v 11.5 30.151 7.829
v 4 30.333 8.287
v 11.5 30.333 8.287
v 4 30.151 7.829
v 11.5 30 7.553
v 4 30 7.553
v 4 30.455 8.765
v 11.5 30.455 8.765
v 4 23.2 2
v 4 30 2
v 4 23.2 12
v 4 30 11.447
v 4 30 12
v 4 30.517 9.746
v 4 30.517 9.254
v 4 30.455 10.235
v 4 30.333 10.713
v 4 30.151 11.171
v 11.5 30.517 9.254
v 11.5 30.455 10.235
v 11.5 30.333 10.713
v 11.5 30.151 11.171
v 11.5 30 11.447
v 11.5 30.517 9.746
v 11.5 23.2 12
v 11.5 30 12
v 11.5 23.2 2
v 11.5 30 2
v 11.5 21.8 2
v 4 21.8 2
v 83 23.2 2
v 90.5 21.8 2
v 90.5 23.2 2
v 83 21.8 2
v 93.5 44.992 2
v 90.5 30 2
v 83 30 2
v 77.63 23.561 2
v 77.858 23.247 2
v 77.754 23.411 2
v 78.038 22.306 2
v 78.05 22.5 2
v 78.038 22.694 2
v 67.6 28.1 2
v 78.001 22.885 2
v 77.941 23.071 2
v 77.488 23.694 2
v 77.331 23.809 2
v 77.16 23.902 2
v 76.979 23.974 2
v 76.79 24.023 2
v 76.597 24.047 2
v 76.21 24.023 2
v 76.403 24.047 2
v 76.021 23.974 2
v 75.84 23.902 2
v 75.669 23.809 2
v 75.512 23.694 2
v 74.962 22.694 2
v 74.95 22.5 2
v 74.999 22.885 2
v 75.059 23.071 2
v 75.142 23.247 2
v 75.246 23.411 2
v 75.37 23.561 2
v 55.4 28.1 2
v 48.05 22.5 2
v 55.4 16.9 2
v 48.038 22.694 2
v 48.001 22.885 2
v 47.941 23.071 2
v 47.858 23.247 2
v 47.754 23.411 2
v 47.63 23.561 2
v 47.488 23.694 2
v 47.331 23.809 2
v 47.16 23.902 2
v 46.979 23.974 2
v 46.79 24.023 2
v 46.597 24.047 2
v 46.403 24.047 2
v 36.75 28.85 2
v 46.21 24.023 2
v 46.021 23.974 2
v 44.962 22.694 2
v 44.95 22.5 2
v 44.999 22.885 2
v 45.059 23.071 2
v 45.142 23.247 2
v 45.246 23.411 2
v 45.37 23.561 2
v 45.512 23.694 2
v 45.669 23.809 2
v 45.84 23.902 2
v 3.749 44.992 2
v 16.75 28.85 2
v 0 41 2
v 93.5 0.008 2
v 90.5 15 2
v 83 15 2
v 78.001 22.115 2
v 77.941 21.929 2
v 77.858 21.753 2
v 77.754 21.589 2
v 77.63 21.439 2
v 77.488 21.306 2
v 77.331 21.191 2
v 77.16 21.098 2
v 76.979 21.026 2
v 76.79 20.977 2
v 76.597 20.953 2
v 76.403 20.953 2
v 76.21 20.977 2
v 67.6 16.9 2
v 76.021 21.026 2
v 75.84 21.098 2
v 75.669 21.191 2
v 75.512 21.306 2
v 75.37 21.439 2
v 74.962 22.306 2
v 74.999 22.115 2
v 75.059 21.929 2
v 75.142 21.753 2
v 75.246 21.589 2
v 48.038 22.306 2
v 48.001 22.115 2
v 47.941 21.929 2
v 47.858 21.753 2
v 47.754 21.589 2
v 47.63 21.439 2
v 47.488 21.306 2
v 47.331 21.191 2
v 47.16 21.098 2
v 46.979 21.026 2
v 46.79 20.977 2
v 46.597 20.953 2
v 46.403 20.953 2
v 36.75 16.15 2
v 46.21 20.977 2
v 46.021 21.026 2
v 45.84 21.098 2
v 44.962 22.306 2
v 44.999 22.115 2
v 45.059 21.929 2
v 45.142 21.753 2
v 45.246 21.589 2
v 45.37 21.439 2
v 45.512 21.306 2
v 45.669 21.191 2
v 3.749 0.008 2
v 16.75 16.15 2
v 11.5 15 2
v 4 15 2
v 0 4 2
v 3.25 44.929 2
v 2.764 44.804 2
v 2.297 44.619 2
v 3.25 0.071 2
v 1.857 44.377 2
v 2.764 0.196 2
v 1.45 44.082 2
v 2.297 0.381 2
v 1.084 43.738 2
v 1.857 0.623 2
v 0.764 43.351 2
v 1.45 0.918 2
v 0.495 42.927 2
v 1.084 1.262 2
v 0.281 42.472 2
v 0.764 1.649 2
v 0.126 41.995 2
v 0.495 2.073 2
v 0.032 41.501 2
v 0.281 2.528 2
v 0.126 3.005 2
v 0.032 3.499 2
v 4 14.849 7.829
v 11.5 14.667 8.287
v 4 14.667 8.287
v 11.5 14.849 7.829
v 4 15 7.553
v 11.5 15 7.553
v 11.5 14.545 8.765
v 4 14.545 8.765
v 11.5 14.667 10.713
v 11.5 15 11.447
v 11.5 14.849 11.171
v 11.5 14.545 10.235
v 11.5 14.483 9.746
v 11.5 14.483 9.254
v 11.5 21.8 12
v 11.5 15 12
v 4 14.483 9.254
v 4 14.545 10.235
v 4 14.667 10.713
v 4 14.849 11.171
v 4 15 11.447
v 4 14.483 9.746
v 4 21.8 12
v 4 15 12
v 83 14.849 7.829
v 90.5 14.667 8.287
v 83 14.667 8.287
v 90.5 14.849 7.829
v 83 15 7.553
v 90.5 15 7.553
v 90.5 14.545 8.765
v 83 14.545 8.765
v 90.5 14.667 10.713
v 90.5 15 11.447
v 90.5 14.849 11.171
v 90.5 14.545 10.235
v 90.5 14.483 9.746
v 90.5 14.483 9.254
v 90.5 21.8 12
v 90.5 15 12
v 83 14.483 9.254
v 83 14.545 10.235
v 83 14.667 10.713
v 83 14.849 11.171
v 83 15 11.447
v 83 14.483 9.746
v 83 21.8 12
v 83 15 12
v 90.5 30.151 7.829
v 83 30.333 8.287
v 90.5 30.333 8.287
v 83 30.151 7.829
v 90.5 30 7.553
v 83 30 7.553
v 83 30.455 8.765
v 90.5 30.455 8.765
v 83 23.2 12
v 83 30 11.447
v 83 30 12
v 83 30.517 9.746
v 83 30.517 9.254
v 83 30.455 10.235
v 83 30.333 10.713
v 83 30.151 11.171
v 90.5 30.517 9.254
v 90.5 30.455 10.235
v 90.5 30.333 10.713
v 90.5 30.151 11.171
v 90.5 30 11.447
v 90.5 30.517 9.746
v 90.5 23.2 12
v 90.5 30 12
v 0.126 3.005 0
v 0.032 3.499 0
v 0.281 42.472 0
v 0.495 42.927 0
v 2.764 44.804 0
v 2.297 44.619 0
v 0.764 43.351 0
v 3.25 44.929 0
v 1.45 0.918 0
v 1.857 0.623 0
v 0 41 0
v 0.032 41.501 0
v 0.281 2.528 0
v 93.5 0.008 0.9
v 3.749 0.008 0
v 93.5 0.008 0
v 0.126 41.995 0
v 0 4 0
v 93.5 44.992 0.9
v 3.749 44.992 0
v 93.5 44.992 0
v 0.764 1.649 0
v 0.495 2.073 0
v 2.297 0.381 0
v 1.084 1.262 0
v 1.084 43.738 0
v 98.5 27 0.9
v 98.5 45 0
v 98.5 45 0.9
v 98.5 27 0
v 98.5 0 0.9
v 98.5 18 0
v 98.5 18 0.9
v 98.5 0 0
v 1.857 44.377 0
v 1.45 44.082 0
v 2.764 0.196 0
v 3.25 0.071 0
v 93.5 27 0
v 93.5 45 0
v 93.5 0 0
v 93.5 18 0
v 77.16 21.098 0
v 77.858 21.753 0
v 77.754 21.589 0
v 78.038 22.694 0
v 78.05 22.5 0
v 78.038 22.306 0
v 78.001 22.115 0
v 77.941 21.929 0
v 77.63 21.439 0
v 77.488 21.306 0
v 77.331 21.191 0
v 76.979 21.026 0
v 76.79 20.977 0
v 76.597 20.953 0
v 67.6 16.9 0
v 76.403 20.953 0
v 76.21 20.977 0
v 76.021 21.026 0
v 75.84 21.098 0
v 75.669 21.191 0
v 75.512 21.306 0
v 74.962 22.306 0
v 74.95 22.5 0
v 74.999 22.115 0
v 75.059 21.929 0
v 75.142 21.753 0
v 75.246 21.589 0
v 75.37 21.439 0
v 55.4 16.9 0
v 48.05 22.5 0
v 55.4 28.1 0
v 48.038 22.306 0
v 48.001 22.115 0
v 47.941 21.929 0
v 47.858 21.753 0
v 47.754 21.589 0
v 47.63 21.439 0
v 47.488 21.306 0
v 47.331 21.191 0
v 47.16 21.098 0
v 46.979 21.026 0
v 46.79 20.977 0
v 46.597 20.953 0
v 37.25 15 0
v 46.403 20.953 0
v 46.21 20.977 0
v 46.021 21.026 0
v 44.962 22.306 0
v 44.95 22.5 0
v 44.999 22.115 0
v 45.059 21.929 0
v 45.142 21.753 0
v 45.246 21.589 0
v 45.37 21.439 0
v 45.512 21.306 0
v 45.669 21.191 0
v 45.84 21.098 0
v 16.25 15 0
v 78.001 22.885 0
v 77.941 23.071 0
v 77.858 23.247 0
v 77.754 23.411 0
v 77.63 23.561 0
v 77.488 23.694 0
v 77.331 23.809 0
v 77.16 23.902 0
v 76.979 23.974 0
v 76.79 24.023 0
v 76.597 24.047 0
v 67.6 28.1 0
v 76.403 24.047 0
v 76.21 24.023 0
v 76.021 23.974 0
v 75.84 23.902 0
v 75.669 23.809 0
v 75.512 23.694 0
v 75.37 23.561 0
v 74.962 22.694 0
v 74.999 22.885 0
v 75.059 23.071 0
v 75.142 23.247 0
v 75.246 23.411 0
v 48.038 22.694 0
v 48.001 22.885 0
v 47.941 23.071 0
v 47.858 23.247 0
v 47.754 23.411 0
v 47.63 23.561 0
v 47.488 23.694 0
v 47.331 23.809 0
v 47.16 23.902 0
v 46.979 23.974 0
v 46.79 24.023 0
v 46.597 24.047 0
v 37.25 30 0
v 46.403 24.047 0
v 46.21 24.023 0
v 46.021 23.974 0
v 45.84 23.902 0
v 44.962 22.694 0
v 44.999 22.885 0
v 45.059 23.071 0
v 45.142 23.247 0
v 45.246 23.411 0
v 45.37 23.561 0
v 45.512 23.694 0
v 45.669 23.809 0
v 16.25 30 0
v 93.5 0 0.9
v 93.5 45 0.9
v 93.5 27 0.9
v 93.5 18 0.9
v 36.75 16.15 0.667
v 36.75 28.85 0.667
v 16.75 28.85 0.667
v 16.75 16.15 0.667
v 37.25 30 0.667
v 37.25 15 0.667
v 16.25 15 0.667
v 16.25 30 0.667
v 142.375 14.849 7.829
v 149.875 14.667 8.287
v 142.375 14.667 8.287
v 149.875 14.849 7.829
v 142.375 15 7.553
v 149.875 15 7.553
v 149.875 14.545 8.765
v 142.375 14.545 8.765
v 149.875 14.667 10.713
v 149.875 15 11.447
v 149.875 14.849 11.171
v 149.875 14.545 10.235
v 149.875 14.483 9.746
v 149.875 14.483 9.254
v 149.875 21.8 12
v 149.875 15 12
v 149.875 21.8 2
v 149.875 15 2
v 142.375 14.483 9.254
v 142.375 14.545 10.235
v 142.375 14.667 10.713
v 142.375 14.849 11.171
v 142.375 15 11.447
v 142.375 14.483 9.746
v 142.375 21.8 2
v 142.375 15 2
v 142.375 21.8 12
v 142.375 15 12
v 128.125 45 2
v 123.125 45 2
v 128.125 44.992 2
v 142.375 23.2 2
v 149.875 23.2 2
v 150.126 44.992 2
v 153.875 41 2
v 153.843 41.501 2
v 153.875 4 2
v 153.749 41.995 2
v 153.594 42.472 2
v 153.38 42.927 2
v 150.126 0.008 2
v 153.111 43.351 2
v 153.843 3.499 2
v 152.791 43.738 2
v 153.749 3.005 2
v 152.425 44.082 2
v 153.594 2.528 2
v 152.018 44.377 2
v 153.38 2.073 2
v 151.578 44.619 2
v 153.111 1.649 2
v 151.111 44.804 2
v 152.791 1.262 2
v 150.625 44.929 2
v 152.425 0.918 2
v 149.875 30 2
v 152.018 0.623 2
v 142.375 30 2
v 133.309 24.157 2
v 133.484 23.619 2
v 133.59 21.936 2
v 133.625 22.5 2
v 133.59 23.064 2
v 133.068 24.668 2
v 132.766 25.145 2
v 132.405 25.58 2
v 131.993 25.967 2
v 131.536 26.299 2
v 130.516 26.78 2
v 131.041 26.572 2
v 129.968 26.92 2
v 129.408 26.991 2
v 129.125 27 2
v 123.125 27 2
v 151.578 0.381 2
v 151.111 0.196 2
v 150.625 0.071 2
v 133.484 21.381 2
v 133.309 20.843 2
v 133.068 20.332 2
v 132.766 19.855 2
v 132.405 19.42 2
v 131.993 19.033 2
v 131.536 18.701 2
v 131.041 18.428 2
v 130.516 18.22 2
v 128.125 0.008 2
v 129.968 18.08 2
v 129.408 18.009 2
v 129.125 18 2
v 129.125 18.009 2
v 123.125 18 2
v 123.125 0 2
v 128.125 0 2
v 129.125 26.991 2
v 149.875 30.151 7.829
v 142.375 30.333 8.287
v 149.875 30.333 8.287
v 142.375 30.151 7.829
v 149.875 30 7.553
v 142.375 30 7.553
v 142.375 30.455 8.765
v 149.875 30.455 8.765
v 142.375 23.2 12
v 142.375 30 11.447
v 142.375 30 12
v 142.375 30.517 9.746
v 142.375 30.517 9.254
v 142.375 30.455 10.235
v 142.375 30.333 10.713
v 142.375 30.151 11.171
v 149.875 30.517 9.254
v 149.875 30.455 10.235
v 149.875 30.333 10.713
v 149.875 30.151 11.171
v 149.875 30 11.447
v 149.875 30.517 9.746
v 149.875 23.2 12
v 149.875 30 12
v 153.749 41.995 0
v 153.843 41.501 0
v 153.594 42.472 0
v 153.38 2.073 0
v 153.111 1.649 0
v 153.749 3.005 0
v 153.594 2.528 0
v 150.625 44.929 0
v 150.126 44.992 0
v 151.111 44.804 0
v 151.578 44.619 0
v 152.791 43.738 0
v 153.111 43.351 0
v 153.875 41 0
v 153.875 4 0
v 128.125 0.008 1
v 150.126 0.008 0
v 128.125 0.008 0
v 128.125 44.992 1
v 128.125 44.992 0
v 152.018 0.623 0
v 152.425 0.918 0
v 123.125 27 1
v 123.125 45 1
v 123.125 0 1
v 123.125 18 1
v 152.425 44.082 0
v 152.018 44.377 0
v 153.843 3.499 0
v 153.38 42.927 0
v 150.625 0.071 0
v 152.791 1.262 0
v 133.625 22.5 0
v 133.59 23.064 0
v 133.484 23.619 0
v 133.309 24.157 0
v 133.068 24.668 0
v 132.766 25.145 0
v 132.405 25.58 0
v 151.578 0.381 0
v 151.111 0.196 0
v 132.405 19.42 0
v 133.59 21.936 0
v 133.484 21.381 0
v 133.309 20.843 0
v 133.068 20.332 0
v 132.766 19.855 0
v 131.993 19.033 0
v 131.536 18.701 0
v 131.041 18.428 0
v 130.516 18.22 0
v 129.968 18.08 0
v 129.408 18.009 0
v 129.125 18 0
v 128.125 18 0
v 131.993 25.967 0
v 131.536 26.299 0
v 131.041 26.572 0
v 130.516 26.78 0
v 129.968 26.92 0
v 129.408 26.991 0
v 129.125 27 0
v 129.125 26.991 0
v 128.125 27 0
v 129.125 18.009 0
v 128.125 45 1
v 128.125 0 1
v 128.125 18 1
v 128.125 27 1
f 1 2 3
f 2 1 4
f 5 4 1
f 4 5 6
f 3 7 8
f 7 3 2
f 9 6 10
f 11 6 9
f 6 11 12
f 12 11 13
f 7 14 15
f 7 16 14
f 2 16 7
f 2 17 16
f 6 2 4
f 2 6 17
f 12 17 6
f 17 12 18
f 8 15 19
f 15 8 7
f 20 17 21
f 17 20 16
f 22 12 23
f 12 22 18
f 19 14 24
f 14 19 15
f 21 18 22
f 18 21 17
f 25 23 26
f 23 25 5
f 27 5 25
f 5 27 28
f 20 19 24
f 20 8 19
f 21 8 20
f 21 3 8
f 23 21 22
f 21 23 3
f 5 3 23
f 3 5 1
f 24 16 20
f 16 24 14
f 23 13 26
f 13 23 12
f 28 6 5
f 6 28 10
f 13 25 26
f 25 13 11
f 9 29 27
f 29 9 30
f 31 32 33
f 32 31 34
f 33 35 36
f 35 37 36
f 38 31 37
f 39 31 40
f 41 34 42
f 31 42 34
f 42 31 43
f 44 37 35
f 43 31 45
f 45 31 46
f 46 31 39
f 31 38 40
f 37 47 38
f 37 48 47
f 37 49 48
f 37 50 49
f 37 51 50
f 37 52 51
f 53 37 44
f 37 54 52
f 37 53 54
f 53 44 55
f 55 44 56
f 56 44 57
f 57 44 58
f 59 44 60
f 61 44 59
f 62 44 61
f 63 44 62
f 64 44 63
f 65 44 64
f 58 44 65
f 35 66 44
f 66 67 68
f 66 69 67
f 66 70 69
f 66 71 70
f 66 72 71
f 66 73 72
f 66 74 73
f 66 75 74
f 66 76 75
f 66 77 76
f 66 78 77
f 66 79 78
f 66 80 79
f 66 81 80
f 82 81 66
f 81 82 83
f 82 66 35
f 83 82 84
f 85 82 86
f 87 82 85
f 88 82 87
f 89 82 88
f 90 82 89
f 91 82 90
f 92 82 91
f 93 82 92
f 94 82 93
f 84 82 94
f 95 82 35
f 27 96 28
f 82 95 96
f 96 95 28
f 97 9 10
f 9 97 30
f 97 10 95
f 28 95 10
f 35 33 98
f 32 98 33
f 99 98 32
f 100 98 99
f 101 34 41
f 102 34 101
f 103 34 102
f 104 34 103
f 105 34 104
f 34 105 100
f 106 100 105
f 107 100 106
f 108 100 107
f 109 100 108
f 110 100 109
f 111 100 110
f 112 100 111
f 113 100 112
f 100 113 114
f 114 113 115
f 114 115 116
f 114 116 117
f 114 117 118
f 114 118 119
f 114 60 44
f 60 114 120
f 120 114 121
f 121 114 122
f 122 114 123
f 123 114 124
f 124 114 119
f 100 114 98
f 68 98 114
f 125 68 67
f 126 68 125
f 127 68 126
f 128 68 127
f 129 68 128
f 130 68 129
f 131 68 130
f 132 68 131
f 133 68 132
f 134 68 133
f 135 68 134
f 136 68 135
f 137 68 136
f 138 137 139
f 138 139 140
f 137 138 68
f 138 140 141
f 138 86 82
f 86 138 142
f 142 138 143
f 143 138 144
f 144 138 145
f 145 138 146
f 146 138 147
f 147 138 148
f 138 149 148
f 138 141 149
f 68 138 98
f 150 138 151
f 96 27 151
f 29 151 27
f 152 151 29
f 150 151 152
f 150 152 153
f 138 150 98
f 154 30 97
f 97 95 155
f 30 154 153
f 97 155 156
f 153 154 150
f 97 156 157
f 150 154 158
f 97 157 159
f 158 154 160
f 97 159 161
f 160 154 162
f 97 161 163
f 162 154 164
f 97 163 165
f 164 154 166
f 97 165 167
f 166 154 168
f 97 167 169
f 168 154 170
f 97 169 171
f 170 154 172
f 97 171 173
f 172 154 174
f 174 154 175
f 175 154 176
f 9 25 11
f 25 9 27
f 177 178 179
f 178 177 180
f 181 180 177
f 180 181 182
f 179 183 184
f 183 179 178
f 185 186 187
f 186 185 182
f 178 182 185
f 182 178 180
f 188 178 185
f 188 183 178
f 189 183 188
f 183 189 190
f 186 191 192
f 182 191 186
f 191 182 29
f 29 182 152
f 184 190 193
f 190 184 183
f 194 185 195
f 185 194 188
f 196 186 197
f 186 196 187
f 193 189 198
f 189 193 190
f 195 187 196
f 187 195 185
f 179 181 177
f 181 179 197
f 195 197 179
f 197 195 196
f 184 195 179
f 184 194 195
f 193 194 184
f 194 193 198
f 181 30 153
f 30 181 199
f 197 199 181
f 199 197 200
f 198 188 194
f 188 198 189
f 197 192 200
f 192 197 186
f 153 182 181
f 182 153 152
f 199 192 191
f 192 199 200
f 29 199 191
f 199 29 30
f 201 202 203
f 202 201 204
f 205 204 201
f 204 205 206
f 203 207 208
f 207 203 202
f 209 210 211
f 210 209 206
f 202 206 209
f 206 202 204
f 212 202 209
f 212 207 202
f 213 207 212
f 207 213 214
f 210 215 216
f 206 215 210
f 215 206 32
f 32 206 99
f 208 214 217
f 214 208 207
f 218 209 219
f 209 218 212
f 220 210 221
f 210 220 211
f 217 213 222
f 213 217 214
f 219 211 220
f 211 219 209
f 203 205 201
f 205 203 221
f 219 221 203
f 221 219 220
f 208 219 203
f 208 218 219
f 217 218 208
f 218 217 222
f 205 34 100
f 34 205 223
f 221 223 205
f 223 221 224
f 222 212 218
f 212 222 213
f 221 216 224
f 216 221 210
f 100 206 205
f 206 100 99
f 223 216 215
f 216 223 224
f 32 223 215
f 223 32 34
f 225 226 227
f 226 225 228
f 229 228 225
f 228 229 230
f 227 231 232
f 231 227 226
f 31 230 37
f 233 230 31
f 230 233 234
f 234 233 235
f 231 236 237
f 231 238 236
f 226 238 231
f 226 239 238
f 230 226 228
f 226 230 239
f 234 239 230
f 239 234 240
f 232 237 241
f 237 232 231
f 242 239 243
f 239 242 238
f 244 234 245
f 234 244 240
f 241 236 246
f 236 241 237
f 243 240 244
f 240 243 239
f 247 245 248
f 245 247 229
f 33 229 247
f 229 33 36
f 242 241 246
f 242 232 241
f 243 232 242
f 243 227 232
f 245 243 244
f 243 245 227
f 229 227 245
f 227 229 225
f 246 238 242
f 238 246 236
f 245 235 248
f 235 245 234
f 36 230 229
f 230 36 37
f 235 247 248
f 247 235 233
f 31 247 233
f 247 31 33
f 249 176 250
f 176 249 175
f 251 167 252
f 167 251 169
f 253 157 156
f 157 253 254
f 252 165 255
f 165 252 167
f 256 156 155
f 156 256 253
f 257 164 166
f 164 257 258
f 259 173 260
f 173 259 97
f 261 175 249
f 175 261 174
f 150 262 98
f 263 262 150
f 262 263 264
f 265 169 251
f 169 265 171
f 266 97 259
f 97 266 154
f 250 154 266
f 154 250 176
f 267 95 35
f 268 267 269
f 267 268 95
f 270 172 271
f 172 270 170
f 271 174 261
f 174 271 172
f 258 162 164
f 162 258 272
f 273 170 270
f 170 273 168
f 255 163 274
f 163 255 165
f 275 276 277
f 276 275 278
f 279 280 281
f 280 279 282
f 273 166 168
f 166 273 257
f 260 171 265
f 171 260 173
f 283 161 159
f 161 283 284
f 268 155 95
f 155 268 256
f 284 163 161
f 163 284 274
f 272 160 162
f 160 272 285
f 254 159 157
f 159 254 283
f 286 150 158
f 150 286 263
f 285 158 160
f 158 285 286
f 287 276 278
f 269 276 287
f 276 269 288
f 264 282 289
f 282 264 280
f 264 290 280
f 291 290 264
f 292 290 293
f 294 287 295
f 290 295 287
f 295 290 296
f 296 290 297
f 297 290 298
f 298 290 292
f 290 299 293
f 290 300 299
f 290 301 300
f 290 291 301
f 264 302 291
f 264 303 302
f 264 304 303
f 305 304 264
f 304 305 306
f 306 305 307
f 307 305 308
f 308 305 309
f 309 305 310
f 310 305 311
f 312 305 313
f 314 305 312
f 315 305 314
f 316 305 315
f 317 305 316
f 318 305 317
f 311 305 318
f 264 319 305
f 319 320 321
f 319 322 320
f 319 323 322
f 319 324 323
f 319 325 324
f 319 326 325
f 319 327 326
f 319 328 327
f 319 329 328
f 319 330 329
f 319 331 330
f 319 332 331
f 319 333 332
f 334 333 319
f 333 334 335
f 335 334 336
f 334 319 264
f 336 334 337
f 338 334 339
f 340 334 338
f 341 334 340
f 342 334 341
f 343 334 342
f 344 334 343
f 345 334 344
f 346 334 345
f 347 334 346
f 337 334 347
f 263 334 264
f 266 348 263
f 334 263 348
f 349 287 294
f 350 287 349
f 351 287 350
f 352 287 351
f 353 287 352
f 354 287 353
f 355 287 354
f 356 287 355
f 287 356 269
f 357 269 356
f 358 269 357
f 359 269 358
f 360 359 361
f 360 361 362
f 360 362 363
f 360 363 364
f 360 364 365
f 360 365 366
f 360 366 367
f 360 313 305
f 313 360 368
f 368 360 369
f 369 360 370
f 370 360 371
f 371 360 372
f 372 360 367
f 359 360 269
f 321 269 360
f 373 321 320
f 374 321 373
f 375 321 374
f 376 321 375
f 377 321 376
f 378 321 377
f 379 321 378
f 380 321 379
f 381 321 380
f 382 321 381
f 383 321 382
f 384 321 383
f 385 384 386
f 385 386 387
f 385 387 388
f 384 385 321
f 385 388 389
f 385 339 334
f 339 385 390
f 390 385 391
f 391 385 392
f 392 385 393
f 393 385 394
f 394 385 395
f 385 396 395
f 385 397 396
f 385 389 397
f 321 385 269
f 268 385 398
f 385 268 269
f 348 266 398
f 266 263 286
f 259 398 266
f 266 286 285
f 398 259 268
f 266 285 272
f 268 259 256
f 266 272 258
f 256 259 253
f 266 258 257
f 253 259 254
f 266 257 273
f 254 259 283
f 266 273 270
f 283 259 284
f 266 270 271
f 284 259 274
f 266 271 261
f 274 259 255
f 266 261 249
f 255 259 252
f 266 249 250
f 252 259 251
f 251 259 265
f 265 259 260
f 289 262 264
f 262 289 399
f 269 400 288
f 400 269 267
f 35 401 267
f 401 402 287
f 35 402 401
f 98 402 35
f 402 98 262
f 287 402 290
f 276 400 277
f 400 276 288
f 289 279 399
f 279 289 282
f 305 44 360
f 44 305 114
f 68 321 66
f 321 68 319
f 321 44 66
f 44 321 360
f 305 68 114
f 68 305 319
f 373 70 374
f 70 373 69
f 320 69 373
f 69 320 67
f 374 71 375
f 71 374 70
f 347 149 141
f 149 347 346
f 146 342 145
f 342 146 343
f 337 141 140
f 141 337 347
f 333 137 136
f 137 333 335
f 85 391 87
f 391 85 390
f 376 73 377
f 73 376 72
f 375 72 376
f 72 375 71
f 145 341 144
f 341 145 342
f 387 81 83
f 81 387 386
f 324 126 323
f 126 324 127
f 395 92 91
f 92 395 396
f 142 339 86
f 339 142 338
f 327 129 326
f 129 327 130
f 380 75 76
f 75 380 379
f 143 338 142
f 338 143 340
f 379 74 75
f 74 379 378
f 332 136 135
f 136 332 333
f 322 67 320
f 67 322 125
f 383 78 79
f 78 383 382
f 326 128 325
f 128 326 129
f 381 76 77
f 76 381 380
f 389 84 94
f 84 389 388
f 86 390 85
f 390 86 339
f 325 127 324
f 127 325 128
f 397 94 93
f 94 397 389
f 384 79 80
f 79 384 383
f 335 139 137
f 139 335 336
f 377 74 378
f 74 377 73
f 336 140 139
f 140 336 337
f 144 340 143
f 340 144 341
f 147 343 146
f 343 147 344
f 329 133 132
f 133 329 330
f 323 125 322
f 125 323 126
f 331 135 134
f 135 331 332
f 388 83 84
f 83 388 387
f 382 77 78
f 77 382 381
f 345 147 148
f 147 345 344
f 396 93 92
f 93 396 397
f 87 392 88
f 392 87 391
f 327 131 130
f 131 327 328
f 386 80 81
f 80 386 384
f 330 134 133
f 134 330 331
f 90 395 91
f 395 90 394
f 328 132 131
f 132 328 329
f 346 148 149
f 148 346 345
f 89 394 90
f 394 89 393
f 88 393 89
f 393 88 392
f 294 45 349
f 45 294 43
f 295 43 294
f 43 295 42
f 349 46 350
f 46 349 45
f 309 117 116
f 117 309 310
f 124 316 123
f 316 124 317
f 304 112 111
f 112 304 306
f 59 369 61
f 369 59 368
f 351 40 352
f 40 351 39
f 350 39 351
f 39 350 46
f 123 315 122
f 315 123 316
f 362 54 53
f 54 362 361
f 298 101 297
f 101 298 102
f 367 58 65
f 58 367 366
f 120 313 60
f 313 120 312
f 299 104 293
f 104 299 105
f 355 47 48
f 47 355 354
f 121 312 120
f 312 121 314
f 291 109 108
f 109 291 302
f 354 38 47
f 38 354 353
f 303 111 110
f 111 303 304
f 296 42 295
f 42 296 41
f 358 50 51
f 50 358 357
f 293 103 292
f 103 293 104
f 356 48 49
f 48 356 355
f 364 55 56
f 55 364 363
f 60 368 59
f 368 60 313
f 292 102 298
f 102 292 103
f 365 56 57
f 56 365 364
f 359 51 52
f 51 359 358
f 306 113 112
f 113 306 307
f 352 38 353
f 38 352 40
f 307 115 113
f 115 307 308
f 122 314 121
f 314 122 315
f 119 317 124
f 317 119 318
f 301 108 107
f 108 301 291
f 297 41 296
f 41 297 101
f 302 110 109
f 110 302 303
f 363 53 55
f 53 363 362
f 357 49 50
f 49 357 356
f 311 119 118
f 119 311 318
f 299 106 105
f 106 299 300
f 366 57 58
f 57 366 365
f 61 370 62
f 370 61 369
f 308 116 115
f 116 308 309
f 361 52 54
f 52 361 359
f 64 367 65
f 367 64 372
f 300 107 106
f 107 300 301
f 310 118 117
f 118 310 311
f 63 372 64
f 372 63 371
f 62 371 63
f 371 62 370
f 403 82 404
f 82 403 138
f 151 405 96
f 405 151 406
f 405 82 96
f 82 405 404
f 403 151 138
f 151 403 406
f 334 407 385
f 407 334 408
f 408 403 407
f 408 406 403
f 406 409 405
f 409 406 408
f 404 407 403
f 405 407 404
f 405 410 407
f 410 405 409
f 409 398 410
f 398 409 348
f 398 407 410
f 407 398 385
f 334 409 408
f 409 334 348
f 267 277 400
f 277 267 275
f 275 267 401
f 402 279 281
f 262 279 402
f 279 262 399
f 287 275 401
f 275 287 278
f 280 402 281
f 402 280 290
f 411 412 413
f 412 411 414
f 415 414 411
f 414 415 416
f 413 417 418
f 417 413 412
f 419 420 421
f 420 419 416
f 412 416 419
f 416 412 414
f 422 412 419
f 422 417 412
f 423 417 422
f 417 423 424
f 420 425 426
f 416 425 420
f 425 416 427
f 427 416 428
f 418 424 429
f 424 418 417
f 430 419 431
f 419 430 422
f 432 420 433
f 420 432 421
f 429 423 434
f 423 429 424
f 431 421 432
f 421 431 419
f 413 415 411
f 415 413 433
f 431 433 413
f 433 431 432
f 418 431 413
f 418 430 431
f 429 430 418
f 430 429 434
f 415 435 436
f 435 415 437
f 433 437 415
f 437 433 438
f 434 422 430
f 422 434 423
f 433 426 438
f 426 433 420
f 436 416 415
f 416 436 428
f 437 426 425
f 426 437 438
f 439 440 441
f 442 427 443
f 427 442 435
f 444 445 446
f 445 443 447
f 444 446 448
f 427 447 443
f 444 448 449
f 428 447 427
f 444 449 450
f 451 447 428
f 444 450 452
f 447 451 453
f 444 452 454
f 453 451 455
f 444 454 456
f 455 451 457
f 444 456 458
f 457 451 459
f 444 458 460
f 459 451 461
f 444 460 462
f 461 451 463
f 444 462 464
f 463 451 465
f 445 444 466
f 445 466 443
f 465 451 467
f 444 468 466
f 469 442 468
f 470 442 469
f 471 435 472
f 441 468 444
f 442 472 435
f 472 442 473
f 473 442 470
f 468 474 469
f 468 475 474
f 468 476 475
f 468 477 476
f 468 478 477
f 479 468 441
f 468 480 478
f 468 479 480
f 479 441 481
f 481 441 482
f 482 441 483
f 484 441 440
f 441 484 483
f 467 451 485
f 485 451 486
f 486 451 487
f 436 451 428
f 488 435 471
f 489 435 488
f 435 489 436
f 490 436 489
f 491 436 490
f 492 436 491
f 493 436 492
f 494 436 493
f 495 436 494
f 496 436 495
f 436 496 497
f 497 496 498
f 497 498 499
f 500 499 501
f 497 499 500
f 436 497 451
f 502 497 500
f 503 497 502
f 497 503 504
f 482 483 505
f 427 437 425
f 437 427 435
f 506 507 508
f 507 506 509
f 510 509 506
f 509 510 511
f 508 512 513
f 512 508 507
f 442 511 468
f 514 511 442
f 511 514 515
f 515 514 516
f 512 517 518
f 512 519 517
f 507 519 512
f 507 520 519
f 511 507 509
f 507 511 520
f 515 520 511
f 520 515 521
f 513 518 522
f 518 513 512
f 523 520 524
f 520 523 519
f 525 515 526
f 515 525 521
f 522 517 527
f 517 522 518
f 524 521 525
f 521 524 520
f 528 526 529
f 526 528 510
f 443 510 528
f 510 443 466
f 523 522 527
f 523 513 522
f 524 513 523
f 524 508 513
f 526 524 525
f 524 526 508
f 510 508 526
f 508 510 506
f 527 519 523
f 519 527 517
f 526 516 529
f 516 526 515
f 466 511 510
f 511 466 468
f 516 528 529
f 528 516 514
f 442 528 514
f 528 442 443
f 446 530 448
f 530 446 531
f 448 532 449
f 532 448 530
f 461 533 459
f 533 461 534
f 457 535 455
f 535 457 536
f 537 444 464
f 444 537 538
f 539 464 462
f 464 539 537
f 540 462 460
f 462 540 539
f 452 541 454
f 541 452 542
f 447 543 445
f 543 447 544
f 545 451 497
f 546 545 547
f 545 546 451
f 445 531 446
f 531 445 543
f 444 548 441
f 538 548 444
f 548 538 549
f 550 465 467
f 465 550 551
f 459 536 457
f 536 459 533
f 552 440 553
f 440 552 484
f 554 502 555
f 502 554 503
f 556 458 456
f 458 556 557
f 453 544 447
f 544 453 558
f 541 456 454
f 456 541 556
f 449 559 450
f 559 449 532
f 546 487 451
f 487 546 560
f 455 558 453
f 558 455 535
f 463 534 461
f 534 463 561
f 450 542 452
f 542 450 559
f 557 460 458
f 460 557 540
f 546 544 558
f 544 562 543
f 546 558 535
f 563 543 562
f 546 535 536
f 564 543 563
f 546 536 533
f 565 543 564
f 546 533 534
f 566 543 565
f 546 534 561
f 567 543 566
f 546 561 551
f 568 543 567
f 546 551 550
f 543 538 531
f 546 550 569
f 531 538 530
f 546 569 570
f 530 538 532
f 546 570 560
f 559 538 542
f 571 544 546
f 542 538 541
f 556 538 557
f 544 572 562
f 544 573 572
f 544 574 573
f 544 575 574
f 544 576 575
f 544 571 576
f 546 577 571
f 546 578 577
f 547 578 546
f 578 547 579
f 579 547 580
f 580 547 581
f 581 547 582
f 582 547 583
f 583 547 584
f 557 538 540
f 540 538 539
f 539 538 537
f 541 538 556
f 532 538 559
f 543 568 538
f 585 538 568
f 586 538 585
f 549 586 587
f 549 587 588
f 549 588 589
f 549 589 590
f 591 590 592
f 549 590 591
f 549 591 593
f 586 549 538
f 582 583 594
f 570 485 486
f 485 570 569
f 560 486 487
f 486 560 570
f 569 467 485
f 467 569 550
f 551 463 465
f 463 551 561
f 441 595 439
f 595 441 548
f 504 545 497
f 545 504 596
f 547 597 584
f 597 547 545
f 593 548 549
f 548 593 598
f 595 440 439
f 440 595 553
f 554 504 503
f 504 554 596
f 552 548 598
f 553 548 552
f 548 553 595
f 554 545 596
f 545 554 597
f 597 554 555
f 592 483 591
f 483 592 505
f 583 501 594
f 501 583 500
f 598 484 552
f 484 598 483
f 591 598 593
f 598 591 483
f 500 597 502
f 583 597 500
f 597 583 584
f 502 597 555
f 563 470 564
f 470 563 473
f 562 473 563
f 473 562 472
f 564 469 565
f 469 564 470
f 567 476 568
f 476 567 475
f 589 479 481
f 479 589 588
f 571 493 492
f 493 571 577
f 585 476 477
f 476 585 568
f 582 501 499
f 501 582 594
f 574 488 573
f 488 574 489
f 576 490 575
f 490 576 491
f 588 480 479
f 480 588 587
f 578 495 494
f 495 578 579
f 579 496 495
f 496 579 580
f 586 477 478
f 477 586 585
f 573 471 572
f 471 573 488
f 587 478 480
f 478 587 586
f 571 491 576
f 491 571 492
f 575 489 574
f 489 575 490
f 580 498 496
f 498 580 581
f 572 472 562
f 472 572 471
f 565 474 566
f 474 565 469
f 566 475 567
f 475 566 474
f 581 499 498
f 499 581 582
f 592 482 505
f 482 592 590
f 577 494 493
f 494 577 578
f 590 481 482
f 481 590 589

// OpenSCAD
//Connector plate for Kossel Mini 1515

//smoothing of curves
$fn=50;

//extra dimension to remove ambiguity of walls
ex=0.10;

//aluminium extrusion dimension
profile=15;

//mounting
edgeWidth=2;
screwDiameter=3.1;
screwHeadDiameter=5.5; 
screwHeadHeight=3; 
mountWidth=screwHeadDiameter+edgeWidth;
mountThickness=screwHeadHeight+1.5;

//USB B connector dimensions
usbWidth=12+2*ex;
usbHeight=11+2*ex;
usbScrewsDistance=30;
usbFullWidth=38;

//power connector dimensions
powerHeight=9;
powerWidth=10.5;
powerRadius=4.5;

//switch dimensions
switchInnerLength=20;
switchInnerWidth=12.7;
switchOuterLength=21;
switchOuterWidth=15;

//plate dimensions
overlap=5;
height=3*profile;
roundingRadius=4;
widthUSBpart=usbFullWidth+switchOuterLength+3.5*overlap+2*mountWidth+roundingRadius+3;
widthPowerPart=powerWidth+overlap+1.5*mountWidth+roundingRadius;
thickness=2;


// ENTRY POINT

draw();

module draw(){
    drawUSBpart();
    translate([widthUSBpart*1.25, 0, 0]) drawPowerPart();
    %translate([0, 0, thickness]) cube([200, 15, 15]);
    %translate([0, 30, thickness]) cube([200, 15, 15]);
//      clamp();
//    switch();
}

module drawUSBpart(){
    transx=switchOuterLength+2*overlap;
    difference(){
        union(){
            rounded_rect(widthUSBpart, height, thickness, roundingRadius);
            translate([widthUSBpart-overlap, 0, 0])
                cube([overlap, height, thickness]);
            translate([roundingRadius+mountWidth, 2*profile, thickness])
                rotate([0,0,180]) clampClip();
            translate([roundingRadius, profile, thickness])
                clampClip();
            translate([widthUSBpart-mountWidth-overlap-3, profile, thickness])
                clampClip();
            translate([widthUSBpart-overlap-3, 2*profile, thickness])
                rotate([0,0,180]) clampClip();
//            translate([roundingRadius, 2*profile-mountThickness, thickness])
//                mount();
//            translate([widthUSBpart-overlap-3, profile+mountThickness, thickness]) 
//                rotate([0,0,180]) mount();
        }
        //USB cutout
        translate([transx+mountWidth+roundingRadius+usbFullWidth/2, height/2, -ex])
            USBcutout();
        //switch cutout
        translate([mountWidth/2+roundingRadius+usbFullWidth/2, height/2, -ex])
            switchCutout();
        //overlap
        translate([widthUSBpart-overlap, -ex, thickness/2-ex])
            cube([overlap+ex, height+2*ex, thickness/2+2*ex]);
        translate([widthUSBpart-overlap, height/2-powerHeight/2, -ex])
            cube([overlap+ex, powerHeight, thickness]);
    }
}

module USBcutout(){
    translate([-usbWidth/2, -usbHeight/2, 0])
            cube([usbWidth, usbHeight, thickness+2*ex]);
        translate([-usbScrewsDistance/2, 0, 0])
            cylinder(d=screwDiameter, h=thickness+2*ex);
        translate([usbScrewsDistance/2, 0, 0])
            cylinder(d=screwDiameter, h=thickness+2*ex);
}

module switchCutout(){
        translate([-switchInnerLength/2, -switchInnerWidth/2, 0]) cube([switchInnerLength, switchInnerWidth, thickness*2]);
        translate([-switchOuterLength/2, -switchOuterWidth/2, 0]) cube([switchOuterLength, switchOuterWidth, 1/3*thickness+ex]); 
}

module drawPowerPart(){
    difference(){
        union(){
            rounded_rect(widthPowerPart, height, thickness, roundingRadius);
            cube([overlap, height, thickness]);
            translate([widthPowerPart-roundingRadius-mountWidth, profile, thickness])
                    clampClip();
            translate([widthPowerPart-roundingRadius, 2*profile, thickness])
                rotate([0,0,180]) clampClip();
//            translate([widthPowerPart-roundingRadius-mountWidth, 2*profile-mountThickness, thickness])
//                mount(); 
        }
        translate([-ex, -ex, -ex])
            cube([overlap+ex, height+2*ex, thickness/2+ex]);
        translate([-ex, height/2-powerHeight/2, -ex])
            cube([powerWidth-powerRadius+ex, powerHeight, thickness+2*ex]);
        translate([powerWidth-powerRadius, height/2, -ex])
            cylinder(r=powerRadius, h=thickness+2*ex);
    }
}

// TEST

module switch(){
    difference(){
    rounded_rect(widthPowerPart, height, thickness, roundingRadius);
    translate([widthPowerPart/2-switchInnerWidth/2, height/2-switchInnerLength/2, 0-ex])
        cube([switchInnerWidth, switchInnerLength, thickness*2]);
    translate([widthPowerPart/2-switchOuterWidth/2, height/2-switchOuterLength/2, 0-ex])
        cube([switchOuterWidth, switchOuterLength, 1/3*thickness+ex]);
    }
}

clampWidth=mountWidth;

module clamp(){
    
    rounded_rect(widthPowerPart, height, thickness, roundingRadius);
    translate([widthPowerPart/2-clampWidth/2, profile, thickness])
        clampClip();
    translate([widthPowerPart/2+clampWidth/2, profile*2, thickness])
        rotate([0,0,180]) clampClip();
}

module clampClip(clipWidth=3, clipHeight=0.35){
    cube([clampWidth, clampWidth-2*clipHeight, 2/3*profile]);
    //new clip design
    difference(){
        translate ([0, (clampWidth - 2*clipHeight)/2,1/2*profile]) 
            rotate([0, 90,0]) cylinder(h=clampWidth, d=clampWidth + clipHeight);
        translate ([0-ex, 0, 0]) cube([clampWidth+2*ex, clampWidth, profile]);
    }
//    translate([0, -clipHeight, profile/2-clipWidth/2]) rotate([-atan(clipHeight/clipWidth),0,0]) cube([clampWidth, clipHeight, clipWidth]);
}

// UTILITY

// Make a rounded rectangle
module rounded_rect(x, y, z, radius) {
    translate([radius,radius,0]) //move origin to outer limits
	linear_extrude(height=z)
		minkowski() {
			square([x-2*radius,y-2*radius]); //keep outer dimensions given by x and y
			circle(r = radius);
		}
}

//make mounting
module mount(){
    difference(){
        cube([mountWidth, mountThickness, profile]);
        translate([mountWidth/2, -ex, profile/2]) rotate([-90,0,0])
        union(){
            cylinder(d=screwHeadDiameter+2*ex, h=screwHeadHeight+2*ex);
            cylinder(d=screwDiameter, h=mountThickness+2*ex);
        }
    }
}
